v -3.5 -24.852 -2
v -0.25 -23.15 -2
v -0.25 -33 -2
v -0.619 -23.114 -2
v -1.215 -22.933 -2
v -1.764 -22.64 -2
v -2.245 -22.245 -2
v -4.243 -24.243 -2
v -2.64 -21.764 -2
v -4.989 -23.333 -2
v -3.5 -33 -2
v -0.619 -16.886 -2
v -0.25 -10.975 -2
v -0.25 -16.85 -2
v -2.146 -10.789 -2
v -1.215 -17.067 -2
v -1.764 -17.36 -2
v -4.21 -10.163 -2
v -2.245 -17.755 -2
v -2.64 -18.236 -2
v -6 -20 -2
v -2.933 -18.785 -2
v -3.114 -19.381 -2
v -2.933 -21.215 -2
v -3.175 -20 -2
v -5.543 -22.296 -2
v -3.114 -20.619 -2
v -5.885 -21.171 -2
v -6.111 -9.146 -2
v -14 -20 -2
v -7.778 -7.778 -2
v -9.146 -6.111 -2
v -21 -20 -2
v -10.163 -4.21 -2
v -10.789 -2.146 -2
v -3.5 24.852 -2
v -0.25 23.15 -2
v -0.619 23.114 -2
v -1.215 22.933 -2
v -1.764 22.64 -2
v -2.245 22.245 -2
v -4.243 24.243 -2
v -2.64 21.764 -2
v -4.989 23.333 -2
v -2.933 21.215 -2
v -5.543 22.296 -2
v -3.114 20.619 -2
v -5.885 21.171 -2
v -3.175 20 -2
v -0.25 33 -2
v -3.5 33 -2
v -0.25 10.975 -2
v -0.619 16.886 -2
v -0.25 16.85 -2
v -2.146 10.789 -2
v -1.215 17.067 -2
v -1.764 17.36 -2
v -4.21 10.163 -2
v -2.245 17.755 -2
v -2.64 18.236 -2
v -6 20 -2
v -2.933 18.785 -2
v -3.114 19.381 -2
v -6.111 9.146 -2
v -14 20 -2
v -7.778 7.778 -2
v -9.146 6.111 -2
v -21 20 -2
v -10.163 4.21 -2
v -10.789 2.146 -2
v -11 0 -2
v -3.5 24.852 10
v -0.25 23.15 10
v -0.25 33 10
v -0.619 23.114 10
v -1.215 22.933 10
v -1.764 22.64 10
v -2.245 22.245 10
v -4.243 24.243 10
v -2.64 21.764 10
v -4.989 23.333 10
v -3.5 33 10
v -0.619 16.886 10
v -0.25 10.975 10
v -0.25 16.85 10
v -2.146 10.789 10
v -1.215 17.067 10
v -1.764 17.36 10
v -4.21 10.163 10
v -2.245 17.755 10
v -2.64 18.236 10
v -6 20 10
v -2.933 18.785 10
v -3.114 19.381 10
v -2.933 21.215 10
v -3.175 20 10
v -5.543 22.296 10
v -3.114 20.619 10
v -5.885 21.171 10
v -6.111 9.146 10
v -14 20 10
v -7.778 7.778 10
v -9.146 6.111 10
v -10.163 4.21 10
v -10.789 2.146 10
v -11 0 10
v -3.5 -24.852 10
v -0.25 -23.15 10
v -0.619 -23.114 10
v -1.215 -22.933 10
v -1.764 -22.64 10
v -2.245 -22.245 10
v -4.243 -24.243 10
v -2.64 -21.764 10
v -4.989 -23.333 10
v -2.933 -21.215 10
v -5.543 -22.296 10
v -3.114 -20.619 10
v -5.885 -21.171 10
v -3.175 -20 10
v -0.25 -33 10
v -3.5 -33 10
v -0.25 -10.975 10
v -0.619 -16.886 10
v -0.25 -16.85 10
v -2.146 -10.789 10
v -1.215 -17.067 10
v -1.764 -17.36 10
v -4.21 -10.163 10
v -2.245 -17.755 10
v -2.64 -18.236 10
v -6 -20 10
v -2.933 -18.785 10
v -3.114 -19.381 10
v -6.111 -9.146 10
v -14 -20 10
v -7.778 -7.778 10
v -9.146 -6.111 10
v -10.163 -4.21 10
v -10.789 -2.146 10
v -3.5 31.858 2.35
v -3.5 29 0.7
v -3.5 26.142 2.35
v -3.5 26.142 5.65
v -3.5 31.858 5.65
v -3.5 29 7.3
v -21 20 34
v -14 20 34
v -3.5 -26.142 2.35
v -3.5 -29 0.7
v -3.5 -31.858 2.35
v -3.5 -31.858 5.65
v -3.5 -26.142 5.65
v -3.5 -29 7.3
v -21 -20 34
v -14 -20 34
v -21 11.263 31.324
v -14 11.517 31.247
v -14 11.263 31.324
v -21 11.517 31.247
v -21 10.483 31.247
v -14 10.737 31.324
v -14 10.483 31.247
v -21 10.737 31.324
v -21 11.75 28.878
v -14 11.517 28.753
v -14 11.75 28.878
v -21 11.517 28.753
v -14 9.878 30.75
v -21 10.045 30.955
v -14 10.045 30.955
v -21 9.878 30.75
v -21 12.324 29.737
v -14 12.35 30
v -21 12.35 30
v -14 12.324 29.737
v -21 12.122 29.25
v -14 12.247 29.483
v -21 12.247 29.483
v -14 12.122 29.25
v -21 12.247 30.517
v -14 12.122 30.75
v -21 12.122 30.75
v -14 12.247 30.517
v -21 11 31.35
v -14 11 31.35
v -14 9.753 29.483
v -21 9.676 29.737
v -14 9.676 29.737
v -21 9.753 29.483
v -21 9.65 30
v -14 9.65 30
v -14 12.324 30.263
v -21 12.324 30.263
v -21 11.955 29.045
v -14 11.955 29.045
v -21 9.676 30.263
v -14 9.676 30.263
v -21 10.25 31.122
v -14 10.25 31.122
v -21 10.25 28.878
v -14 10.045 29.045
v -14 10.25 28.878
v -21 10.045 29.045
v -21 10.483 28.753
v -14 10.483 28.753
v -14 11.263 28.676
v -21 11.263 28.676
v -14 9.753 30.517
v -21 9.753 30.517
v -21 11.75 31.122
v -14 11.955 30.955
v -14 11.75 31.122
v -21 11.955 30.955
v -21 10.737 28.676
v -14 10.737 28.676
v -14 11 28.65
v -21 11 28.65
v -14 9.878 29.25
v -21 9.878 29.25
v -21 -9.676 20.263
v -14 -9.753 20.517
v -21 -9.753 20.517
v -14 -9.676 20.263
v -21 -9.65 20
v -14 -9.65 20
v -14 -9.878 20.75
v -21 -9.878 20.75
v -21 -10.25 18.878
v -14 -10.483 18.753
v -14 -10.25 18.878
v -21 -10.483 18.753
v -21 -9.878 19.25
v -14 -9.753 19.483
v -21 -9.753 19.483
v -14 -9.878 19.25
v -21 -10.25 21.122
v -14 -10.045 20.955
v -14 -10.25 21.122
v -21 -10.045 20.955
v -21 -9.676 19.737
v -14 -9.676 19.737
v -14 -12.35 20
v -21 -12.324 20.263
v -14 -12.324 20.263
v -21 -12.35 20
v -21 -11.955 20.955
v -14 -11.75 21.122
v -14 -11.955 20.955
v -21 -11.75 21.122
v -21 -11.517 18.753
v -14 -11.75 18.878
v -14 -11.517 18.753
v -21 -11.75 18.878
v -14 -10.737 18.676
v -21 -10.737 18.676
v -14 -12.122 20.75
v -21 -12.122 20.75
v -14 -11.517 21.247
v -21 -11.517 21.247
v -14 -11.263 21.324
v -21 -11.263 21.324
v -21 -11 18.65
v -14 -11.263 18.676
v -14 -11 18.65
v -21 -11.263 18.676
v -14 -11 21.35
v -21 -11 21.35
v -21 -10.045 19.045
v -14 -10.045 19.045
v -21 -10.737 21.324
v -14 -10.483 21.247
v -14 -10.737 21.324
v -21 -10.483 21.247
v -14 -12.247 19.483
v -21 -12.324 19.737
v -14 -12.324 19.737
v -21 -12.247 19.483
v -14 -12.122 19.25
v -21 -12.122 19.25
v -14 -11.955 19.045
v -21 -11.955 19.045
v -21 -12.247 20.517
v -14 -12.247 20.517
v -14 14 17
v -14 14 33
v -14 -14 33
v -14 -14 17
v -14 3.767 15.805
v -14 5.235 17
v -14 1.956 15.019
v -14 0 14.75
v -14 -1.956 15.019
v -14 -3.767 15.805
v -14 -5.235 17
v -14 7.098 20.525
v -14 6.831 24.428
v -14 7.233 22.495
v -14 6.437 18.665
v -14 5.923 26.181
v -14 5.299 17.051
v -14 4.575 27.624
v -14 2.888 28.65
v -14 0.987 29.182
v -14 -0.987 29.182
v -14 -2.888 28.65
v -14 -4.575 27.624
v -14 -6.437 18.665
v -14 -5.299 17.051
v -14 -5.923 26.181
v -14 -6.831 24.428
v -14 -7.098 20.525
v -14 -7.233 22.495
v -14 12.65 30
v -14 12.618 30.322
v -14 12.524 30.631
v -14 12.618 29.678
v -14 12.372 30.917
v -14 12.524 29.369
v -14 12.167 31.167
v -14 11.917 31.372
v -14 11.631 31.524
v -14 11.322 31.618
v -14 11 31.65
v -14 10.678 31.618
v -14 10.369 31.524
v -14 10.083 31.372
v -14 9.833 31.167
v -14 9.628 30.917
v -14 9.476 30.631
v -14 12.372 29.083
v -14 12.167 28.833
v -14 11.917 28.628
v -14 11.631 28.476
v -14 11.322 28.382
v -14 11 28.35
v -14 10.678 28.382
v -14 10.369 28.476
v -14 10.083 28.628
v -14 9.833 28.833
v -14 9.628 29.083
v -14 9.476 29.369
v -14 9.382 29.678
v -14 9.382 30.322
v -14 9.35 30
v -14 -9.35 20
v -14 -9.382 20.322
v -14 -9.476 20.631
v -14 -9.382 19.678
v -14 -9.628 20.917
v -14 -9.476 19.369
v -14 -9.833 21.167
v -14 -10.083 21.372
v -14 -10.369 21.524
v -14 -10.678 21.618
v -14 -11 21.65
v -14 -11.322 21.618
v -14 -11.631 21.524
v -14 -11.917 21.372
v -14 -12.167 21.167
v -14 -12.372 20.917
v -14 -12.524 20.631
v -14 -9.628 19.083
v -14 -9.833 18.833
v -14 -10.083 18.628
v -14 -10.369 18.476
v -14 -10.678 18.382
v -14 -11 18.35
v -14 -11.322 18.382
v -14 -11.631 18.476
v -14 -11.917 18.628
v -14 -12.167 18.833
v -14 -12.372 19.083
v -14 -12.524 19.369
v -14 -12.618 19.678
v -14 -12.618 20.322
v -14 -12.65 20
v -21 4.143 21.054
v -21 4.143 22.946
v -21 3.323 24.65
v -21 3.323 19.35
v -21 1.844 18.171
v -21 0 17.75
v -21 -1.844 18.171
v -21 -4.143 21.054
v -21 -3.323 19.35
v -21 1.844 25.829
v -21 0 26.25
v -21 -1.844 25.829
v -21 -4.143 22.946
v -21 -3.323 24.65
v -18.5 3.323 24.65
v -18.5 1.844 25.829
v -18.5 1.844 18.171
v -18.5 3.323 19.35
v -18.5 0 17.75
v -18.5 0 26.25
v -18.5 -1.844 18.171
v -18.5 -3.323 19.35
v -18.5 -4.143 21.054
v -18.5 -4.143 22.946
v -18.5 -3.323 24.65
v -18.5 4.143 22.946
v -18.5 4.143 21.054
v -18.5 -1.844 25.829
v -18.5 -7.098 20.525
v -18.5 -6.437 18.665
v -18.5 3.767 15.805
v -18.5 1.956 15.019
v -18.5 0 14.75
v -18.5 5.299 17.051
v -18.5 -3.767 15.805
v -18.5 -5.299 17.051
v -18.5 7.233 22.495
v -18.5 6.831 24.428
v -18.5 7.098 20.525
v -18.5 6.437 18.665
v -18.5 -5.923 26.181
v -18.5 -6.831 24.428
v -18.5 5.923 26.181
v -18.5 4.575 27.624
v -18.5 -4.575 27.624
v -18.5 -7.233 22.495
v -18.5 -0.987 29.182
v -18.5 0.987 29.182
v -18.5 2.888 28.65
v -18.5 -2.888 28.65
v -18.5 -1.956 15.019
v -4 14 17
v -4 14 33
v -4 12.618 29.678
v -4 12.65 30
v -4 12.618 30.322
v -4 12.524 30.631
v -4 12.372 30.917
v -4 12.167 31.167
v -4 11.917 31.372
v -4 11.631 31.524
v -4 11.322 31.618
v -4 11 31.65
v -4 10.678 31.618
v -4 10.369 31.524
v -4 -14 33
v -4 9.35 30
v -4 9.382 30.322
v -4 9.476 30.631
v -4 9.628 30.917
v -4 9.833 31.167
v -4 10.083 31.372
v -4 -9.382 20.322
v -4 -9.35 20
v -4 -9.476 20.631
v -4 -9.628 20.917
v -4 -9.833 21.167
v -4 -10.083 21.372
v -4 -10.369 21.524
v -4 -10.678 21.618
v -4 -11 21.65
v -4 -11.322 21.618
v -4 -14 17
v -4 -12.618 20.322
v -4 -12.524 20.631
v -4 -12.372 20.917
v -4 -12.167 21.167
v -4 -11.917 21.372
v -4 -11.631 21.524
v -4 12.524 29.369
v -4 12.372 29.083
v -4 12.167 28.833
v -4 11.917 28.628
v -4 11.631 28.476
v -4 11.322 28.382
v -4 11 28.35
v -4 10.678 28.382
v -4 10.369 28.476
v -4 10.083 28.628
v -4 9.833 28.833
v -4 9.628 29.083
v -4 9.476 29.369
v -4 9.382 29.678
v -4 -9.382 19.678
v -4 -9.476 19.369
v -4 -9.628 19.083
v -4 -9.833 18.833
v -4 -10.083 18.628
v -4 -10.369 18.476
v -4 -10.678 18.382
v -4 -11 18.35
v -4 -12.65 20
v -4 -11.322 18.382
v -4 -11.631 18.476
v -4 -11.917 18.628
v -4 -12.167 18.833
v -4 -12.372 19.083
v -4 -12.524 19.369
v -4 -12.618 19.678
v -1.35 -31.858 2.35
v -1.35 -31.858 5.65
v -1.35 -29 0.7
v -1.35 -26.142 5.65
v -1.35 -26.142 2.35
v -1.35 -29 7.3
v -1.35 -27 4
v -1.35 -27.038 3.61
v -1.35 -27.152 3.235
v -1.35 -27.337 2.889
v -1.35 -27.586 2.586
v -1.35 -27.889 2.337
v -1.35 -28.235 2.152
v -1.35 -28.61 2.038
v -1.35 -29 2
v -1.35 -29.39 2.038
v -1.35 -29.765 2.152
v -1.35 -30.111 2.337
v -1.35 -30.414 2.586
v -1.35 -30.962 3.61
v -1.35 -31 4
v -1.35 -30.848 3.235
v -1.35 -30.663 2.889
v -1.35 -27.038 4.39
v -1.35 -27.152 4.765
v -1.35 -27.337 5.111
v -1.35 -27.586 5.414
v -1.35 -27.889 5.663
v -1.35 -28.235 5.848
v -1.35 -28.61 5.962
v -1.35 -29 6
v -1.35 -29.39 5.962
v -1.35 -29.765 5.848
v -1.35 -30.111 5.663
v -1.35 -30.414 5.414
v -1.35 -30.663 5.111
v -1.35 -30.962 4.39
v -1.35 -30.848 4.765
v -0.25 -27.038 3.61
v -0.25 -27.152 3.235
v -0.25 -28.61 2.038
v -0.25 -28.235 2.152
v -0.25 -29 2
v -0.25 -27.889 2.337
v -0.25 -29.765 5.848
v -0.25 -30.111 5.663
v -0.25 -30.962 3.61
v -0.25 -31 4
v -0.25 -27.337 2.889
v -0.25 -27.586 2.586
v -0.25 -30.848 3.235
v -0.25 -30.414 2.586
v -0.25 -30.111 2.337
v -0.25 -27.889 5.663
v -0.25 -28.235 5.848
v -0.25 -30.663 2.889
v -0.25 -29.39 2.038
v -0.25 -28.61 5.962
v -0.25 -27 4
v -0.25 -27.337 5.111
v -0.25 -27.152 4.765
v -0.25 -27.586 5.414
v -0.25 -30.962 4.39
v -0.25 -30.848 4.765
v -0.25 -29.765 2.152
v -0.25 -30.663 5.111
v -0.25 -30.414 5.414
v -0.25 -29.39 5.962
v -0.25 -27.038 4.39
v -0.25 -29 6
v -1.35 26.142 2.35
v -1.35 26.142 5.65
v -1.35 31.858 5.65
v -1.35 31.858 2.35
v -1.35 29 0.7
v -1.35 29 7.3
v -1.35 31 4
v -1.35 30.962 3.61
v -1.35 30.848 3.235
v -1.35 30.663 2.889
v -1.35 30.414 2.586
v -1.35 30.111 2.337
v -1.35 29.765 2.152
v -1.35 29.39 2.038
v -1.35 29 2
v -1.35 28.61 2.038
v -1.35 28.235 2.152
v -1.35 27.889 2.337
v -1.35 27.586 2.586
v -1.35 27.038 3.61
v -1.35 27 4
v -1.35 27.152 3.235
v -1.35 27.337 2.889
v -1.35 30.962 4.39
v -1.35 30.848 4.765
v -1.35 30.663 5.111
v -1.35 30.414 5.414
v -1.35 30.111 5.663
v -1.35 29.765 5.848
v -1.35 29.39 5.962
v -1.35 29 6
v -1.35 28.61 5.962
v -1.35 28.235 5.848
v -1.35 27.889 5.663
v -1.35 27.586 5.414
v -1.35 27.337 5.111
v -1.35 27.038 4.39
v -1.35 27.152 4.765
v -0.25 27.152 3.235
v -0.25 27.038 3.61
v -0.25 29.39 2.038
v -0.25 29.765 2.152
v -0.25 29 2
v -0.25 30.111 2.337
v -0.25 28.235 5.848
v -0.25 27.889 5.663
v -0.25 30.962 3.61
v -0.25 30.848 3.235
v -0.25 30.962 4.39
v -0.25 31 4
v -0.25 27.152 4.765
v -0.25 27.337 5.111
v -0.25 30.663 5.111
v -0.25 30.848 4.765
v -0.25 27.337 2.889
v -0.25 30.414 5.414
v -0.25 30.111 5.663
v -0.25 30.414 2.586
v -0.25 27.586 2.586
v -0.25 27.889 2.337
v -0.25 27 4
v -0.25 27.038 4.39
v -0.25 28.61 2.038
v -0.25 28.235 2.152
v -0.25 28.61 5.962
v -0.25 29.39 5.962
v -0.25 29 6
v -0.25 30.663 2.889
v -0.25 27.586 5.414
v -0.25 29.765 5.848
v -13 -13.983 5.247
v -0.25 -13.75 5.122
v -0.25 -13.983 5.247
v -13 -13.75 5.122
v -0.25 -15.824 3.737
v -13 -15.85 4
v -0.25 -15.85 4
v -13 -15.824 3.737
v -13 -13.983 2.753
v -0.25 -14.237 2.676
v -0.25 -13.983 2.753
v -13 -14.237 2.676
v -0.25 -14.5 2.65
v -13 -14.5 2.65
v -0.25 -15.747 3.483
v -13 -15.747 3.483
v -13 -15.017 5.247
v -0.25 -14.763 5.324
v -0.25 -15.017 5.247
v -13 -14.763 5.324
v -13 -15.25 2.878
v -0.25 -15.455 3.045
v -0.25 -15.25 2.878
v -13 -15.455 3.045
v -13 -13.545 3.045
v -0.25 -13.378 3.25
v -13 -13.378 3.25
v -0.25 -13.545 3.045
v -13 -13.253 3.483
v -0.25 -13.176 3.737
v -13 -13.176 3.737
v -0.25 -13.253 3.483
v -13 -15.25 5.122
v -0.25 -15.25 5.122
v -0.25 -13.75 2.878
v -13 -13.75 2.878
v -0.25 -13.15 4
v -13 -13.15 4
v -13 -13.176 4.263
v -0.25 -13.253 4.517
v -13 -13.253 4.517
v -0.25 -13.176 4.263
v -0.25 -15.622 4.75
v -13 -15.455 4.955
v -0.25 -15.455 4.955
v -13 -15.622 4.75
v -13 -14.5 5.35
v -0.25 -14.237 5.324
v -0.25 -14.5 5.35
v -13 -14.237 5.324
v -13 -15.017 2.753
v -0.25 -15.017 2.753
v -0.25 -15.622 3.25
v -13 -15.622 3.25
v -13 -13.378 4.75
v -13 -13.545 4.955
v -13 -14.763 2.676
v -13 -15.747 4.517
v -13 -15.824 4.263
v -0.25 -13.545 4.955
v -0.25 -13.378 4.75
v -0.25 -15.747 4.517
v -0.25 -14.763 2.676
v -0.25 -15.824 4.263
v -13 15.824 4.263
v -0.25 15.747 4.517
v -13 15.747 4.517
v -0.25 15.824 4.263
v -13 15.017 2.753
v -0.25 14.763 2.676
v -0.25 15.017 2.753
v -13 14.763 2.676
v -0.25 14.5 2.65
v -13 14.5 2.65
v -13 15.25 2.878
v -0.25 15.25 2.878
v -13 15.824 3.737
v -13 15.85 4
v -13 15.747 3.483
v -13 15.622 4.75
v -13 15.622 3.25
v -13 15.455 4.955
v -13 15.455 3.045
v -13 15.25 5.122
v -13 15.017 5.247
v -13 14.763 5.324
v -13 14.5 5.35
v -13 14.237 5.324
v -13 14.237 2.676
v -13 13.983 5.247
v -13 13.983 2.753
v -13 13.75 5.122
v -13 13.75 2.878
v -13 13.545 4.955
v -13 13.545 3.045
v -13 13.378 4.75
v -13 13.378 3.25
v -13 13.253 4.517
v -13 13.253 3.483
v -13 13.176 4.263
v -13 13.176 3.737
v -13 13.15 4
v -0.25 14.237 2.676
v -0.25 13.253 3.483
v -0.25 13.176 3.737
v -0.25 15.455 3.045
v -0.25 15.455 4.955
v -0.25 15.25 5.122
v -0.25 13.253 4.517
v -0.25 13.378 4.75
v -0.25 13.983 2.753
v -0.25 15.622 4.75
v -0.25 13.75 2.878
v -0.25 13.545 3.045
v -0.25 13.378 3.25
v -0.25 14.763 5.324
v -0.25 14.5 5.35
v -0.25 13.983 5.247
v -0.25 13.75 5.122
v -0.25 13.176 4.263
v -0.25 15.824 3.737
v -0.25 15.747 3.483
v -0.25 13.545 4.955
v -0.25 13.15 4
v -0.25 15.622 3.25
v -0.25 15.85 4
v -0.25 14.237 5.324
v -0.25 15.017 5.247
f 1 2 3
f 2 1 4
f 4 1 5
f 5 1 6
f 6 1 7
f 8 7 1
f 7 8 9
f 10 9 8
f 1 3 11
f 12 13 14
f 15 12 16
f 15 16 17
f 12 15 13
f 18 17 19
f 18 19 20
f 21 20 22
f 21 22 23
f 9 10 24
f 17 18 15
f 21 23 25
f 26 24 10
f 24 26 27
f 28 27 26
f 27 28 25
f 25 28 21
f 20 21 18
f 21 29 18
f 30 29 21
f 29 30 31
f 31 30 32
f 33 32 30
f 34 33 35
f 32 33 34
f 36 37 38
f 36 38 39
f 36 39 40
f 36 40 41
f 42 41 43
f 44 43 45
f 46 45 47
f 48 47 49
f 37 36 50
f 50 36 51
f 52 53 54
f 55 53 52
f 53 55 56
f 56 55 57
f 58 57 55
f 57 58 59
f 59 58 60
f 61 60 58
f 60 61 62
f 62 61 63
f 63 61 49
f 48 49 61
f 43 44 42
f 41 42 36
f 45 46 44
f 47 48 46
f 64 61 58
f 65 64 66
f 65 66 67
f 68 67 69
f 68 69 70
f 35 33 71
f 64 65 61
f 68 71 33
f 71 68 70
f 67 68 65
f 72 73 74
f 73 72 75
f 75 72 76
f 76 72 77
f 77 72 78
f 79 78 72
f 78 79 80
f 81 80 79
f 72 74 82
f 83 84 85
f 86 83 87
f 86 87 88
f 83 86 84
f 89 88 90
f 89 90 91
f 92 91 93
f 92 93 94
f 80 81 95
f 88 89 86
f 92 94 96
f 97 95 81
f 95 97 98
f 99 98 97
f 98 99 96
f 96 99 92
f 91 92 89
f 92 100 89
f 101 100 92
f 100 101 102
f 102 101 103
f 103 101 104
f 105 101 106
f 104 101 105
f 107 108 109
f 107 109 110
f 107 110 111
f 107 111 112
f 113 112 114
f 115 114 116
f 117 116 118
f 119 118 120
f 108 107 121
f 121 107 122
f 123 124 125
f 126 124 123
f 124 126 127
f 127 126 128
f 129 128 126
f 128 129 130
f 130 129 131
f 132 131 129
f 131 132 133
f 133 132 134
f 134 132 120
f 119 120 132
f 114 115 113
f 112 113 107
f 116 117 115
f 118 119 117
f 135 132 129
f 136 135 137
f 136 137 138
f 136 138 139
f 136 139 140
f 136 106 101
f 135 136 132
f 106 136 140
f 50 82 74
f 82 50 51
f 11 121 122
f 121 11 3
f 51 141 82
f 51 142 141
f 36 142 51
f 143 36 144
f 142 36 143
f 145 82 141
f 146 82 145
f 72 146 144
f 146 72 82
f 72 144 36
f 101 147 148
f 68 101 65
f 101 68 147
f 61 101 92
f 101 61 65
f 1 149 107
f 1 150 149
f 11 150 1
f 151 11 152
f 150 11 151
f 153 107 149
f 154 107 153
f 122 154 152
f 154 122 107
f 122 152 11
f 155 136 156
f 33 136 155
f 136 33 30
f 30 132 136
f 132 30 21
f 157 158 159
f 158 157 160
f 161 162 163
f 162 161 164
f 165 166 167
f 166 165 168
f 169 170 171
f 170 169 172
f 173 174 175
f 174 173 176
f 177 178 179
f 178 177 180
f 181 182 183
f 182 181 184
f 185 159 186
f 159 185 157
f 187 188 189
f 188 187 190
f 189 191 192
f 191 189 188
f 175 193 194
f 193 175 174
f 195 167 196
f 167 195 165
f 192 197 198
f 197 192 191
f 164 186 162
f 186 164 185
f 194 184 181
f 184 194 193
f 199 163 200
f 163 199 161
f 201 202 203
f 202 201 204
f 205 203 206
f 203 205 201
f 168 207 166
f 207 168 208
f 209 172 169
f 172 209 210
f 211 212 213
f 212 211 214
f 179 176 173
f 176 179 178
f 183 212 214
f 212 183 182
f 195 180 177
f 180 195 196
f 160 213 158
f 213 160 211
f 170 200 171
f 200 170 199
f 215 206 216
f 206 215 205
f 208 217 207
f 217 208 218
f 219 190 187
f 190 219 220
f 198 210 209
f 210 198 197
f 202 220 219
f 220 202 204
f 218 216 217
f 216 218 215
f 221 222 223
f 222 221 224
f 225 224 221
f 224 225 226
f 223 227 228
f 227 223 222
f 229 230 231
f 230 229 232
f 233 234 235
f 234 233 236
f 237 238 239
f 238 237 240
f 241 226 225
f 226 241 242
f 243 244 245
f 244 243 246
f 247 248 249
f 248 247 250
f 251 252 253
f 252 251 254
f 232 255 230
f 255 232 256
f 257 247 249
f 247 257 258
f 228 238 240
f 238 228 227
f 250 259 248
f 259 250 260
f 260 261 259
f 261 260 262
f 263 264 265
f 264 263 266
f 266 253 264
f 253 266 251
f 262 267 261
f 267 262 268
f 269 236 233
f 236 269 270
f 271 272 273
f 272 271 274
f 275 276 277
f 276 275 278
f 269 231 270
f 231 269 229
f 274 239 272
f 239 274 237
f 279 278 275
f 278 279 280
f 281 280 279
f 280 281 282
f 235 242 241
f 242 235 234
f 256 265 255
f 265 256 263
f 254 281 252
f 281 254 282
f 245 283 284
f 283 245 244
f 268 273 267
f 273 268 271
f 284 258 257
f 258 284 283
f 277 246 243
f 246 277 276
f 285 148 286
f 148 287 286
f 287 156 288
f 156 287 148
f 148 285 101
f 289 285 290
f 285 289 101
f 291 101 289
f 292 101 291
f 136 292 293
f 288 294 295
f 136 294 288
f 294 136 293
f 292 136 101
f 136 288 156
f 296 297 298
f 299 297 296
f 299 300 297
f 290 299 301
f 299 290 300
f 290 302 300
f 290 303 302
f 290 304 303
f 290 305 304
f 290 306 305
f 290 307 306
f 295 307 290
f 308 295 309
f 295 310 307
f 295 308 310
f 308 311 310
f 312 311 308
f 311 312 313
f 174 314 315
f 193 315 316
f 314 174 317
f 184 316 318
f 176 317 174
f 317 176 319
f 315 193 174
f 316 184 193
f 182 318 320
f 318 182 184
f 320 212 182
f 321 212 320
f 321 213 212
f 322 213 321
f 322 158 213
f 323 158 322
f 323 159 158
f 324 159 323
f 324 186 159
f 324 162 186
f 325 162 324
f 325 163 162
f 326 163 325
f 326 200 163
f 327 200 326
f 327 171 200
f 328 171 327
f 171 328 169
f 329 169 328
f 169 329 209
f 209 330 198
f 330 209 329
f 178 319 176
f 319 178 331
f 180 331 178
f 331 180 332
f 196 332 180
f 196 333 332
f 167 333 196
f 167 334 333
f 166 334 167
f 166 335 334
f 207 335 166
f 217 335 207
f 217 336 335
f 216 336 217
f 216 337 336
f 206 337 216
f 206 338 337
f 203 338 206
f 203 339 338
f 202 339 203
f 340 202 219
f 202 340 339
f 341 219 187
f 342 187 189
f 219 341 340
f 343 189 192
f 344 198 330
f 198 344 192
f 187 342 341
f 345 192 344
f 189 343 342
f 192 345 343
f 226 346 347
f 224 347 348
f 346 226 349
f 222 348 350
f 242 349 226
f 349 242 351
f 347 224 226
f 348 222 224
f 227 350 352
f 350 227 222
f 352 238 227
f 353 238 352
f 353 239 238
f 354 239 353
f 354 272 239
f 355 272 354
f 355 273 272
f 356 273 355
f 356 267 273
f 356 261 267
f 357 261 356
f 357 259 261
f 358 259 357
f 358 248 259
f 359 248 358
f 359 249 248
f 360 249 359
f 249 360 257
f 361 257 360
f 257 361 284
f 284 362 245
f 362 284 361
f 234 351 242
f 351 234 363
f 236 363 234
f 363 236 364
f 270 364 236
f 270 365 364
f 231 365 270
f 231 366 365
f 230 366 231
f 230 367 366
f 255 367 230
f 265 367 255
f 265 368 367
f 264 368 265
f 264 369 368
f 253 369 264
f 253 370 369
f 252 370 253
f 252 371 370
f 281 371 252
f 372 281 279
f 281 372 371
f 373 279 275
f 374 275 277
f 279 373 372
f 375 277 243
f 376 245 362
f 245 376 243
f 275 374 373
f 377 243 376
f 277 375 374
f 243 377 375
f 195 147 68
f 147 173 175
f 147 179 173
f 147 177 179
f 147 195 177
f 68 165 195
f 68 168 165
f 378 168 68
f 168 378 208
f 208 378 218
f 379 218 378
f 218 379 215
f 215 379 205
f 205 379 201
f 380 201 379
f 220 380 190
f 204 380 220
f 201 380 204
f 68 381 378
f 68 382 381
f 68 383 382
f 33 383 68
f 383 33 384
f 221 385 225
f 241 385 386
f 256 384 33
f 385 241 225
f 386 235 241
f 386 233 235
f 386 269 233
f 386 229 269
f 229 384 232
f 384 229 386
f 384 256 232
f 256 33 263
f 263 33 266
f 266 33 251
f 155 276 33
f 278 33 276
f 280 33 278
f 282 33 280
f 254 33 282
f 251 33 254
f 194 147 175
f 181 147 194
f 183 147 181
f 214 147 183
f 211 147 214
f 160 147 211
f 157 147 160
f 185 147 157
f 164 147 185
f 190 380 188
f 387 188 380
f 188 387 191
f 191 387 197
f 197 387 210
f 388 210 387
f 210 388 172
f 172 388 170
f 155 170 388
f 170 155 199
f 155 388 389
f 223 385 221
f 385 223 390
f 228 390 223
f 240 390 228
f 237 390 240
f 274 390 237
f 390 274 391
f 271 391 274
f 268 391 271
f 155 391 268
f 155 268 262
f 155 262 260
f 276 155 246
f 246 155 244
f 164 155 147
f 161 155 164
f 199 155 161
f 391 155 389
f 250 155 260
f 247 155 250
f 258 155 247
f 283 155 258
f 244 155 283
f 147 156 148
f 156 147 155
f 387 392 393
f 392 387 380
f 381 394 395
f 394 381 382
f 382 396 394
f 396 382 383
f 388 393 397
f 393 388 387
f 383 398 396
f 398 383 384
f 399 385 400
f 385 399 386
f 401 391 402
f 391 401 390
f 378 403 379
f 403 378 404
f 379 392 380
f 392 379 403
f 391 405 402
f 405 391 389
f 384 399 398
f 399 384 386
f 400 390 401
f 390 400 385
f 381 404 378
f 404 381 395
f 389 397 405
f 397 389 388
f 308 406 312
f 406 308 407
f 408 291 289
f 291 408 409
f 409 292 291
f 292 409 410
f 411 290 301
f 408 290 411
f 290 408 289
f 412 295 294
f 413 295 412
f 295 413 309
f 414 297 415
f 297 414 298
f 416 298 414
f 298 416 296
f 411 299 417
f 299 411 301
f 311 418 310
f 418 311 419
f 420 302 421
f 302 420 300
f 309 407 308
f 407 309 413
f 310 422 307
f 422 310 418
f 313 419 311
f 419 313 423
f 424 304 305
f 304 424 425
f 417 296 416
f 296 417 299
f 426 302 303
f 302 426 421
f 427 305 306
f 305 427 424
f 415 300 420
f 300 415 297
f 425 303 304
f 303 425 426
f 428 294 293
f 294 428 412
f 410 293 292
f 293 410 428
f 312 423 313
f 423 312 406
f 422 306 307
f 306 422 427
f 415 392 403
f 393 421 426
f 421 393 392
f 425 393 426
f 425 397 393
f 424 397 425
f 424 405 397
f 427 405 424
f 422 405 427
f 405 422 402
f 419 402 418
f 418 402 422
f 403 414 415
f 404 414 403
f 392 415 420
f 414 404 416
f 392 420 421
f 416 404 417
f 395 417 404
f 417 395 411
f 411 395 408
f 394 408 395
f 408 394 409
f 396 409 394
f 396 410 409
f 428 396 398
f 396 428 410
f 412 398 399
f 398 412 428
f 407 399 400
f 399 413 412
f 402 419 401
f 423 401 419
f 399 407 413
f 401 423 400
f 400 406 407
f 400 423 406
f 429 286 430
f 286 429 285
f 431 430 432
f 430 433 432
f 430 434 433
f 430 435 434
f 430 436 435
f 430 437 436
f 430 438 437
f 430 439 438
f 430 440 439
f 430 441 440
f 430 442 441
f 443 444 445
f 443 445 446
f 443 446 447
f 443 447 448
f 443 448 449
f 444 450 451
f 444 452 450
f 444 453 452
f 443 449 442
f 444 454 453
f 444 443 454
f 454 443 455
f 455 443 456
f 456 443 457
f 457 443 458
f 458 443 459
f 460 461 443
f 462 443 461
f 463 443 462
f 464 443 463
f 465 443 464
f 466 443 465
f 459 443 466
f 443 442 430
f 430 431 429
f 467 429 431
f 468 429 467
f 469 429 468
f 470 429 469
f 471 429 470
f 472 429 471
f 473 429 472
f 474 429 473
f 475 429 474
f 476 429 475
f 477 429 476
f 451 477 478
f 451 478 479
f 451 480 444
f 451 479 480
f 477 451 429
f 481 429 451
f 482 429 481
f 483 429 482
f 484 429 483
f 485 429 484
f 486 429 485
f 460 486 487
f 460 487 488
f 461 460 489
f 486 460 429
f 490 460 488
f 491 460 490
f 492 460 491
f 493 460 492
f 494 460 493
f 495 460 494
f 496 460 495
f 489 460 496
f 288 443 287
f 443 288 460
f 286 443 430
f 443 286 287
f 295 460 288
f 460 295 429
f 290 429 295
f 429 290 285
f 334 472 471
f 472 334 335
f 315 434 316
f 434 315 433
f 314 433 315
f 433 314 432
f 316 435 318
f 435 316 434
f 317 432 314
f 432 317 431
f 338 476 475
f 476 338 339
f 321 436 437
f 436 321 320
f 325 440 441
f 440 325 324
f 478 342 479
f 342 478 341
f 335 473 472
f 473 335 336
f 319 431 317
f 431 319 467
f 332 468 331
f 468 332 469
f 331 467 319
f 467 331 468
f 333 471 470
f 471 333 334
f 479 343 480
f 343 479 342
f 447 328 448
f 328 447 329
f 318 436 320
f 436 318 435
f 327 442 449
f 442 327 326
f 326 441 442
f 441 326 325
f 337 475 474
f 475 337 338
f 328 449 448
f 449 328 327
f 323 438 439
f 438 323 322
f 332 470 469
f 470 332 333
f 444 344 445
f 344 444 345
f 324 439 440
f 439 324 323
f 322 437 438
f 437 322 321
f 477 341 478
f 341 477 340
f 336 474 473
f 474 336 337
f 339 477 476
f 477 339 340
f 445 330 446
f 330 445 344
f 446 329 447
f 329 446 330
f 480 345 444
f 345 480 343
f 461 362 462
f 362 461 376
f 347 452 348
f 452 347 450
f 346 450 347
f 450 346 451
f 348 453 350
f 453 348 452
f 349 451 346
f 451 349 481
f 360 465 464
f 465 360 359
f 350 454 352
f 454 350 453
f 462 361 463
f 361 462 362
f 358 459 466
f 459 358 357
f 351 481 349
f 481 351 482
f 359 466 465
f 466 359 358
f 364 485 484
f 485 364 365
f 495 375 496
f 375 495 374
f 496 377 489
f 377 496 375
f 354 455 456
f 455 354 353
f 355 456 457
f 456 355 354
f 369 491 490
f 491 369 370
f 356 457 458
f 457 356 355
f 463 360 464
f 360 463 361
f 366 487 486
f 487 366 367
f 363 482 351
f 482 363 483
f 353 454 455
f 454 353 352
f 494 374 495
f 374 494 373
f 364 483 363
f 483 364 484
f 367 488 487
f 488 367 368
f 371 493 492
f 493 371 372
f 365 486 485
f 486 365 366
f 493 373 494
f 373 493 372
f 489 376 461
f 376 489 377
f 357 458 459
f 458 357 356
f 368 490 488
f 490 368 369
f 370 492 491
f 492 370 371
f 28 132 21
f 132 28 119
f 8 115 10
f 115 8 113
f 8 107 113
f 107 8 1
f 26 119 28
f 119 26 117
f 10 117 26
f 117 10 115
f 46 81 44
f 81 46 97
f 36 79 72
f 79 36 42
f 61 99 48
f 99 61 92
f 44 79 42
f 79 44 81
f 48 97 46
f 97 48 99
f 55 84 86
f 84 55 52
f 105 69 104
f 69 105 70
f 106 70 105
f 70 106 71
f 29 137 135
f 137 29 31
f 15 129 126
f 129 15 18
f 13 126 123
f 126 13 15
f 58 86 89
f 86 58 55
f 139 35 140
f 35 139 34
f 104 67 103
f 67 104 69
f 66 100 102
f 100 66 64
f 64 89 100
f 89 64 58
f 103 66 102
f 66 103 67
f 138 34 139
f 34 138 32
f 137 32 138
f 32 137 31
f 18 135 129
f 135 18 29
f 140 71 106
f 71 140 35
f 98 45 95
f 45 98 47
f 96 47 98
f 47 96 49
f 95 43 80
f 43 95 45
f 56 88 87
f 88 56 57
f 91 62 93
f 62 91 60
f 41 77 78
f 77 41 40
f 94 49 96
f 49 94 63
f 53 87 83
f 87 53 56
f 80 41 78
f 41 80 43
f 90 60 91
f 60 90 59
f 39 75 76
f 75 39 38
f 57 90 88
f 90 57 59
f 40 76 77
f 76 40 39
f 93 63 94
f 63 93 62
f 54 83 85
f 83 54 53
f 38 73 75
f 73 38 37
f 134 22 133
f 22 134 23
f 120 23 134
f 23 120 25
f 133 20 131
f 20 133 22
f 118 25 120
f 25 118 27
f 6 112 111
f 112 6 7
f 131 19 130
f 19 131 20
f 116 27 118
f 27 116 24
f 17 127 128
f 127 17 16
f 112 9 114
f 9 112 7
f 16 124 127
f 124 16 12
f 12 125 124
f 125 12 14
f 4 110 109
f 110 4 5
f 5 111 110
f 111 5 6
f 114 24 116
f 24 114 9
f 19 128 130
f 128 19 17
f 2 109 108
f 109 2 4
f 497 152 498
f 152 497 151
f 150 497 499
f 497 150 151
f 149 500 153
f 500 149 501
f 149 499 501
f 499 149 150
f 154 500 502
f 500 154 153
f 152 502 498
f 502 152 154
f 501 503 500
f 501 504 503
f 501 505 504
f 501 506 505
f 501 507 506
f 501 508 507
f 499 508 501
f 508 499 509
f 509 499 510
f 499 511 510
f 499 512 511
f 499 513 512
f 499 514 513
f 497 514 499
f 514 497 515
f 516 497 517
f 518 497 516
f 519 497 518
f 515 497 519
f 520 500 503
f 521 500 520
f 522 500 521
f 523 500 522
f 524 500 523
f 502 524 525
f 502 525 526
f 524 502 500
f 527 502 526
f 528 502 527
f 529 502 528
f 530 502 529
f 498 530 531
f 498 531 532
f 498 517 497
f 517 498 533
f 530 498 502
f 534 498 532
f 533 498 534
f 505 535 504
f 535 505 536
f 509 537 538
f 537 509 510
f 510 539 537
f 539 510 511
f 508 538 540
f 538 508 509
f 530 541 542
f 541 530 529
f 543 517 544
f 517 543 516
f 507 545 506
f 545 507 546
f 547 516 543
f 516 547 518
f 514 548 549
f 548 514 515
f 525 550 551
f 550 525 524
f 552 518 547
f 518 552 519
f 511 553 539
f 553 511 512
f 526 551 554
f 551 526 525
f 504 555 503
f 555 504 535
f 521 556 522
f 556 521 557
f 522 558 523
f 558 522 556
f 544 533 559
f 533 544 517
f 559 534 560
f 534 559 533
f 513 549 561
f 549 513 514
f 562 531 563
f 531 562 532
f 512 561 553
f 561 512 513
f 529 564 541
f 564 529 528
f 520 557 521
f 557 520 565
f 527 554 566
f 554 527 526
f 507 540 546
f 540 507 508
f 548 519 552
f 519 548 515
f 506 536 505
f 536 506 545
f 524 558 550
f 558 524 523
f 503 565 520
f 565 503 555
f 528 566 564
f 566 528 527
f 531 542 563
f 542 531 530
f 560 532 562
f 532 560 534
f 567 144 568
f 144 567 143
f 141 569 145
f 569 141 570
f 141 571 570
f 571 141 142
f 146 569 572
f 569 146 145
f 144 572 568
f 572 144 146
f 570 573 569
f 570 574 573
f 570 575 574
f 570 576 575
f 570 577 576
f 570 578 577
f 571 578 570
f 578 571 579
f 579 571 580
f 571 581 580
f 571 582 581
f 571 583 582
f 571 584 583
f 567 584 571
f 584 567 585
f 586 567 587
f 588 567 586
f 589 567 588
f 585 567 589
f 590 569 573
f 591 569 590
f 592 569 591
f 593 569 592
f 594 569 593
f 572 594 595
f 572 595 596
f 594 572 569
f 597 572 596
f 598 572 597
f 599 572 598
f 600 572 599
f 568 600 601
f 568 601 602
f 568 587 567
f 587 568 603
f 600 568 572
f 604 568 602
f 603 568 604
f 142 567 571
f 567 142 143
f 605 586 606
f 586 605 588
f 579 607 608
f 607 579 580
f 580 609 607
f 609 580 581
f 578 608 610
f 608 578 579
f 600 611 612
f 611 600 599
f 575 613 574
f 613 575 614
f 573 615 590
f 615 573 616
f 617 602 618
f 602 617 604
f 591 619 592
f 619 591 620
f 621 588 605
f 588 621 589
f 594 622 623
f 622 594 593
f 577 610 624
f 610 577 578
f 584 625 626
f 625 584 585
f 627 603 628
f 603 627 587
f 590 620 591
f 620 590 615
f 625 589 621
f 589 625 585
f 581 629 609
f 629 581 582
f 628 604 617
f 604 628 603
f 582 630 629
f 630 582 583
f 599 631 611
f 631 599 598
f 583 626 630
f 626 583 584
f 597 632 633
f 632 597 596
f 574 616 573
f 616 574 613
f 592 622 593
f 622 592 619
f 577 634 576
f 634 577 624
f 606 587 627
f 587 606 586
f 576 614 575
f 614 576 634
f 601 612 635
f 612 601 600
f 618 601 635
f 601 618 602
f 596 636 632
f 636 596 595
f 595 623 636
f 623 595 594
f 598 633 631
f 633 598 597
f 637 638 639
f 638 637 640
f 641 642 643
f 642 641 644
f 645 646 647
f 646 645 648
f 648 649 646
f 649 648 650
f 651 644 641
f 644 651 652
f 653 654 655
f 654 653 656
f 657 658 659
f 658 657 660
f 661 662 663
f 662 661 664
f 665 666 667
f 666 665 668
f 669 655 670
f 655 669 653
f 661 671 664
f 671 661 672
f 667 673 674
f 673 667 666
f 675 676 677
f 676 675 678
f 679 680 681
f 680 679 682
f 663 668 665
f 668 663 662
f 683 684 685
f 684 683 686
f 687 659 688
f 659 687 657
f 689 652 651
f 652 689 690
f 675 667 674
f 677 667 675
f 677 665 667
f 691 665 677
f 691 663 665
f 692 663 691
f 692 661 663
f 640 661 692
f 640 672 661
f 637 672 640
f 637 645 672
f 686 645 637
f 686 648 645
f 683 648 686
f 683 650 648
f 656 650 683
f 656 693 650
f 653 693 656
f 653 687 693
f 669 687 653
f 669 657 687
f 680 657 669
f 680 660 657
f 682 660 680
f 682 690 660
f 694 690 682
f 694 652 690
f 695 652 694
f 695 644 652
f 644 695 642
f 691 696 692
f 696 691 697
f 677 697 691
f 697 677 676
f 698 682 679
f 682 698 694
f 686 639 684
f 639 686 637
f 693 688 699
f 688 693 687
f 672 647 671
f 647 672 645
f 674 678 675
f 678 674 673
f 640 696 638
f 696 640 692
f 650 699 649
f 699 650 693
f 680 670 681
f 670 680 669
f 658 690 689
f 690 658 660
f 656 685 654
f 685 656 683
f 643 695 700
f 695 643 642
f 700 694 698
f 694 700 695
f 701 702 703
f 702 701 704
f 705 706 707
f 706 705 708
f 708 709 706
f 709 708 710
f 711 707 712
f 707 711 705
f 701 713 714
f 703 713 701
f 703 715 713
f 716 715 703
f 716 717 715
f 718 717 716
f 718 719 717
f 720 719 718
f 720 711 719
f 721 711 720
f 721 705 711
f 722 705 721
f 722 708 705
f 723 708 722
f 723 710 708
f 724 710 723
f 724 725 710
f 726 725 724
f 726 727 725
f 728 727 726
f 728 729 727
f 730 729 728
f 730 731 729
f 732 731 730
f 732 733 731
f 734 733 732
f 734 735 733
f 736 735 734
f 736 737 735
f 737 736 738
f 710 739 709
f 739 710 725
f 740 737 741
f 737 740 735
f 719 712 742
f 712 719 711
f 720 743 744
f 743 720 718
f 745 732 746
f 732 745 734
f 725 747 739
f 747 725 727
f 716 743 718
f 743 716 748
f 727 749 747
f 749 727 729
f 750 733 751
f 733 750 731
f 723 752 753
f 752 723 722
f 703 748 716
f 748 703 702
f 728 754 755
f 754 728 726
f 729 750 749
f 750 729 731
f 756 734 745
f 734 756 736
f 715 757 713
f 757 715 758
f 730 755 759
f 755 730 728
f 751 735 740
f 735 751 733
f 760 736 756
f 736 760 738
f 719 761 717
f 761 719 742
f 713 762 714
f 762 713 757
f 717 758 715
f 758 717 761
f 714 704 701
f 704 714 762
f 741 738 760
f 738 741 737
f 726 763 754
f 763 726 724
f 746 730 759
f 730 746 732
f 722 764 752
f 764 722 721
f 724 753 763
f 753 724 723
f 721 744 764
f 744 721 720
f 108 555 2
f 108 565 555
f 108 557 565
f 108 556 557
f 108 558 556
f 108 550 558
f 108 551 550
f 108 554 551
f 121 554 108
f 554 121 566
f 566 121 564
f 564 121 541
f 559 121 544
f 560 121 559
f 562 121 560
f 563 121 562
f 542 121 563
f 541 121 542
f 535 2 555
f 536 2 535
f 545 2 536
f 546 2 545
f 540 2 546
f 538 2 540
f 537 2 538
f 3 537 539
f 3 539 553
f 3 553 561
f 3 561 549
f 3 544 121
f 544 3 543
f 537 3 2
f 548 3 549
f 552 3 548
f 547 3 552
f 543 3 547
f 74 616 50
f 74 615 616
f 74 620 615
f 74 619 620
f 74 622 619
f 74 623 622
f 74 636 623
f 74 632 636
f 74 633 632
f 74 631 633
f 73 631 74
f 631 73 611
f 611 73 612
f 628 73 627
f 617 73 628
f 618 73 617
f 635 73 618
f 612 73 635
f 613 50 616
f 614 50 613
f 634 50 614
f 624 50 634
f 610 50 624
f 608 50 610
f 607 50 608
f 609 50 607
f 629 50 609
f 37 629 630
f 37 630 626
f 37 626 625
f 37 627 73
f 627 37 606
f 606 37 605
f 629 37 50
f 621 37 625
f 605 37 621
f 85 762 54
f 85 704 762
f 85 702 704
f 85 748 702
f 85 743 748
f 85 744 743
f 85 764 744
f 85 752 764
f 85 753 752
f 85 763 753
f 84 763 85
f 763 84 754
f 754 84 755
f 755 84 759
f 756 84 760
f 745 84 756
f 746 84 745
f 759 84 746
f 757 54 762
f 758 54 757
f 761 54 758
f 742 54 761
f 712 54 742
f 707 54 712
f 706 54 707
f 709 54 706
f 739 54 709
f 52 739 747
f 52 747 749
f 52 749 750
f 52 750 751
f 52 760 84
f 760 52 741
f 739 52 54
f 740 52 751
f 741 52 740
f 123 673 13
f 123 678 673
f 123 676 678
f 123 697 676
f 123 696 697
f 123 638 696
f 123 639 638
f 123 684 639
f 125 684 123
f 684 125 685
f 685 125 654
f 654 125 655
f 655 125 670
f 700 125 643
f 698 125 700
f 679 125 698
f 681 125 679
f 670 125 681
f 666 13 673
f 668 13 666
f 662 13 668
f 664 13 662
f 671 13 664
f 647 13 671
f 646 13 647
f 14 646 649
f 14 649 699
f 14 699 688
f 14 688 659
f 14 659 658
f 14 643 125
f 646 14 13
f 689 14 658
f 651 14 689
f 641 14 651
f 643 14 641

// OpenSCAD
// file: cherry.scad
module cherry()
{
	difference()
	{
		cube([28,16,10], center=true);
		translate([11,5,0]) cylinder(h=12,r=3.3/2, center=true, $fn=32);
		translate([-11,-5,0]) cylinder(h=12,r=3.3/2, center=true, $fn=32);
	}
}
// file: sidemount.scad
include <cherry.scad>

module sidemount()
{
	difference()
	{
		union()
		{
			difference() 
			{
				translate([0,0,-8]) cube([12,66,25],center=true);
				translate([0,28,-13.5]) cube([13,16,20],center=true);
				translate([0,-28,-13.5]) cube([13,16,20],center=true);
			}

			translate([0,-20,0]) rotate([0,90,0]) cylinder(h=12,r=12/2,center=true,$fn=32);
			translate([0,20,0]) rotate([0,90,0]) cylinder(h=12,r=12/2,center=true,$fn=32);
			translate([0,0,0]) rotate([0,90,0]) cylinder(h=12,r=28/2,center=true,$fn=32);
			translate([0,0,4]) cube([12,40,4],center=true);

			difference() 
			{
				translate([-12,0,-17.5]) cube([36,40,7], center=true);
				rotate([0,0,90]) 
				{
					translate([11,26,-16.5]) cylinder(h=10,r=2.7/2, center=true, $fn=32);
					translate([-11,16,-16.5]) cylinder(h=10,r=2.7/2, center=true, $fn=32);
				}
			
				translate([-18,0,-17.5]) cylinder(h=10,r=8.5/2,center=true);
				translate([-18,0,-15.5]) cylinder(h=6,r=14.5/2,center=true);
			}

			rotate([0,0,90]) translate([0,21,-9.0]) cherry();

		}

		translate([0,-29,-2.5]) cylinder(r=3.3, h=2.3, center=true, $fn=6);
		translate([0,-29,0]) cylinder(r=4/2, h=10, center=true, $fn=32);
		
		translate([0,29,-2.5]) cylinder(r=3.3, h=2.3, center=true, $fn=6);
		translate([0,29,0]) cylinder(r=4/2, h=10, center=true, $fn=32);

		translate([0,-14.5,-3]) cylinder(r=2.7/2, h=20, center=true, $fn=32);
		translate([0,14.5,-3]) cylinder(r=2.7/2, h=20, center=true, $fn=32);

		translate([0,-14.5,11]) cylinder(r=8/2, h=10, center=true, $fn=32);
		translate([0,14.5,11]) cylinder(r=8/2, h=10, center=true, $fn=32);

		translate([0,0,0.25]) cube([13,68,1],center=true);
		rotate([0,90,0]) 
		{
			cylinder(h=14,r=22/2,center=true,$fn=32);
			translate([ 0 ,20,0]) cylinder(h=20,r=6.35/2,center=true, $fn=32);
			translate([ 0 ,0,0]) cylinder(h=20,r=6.35/2,center=true, $fn=32);
			translate([ 0 ,-20,0]) cylinder(h=20,r=6.35/2,center=true, $fn=32);
		}
	}
}
// main file
include <sidemount.scad>

module sidemountbottom()
{
	translate([0,0,4]) rotate([0,90,0])difference()
	{
		sidemount();
		translate([0,0,16]) cube([50,70,32], center=true);
	}
}

sidemountbottom();
